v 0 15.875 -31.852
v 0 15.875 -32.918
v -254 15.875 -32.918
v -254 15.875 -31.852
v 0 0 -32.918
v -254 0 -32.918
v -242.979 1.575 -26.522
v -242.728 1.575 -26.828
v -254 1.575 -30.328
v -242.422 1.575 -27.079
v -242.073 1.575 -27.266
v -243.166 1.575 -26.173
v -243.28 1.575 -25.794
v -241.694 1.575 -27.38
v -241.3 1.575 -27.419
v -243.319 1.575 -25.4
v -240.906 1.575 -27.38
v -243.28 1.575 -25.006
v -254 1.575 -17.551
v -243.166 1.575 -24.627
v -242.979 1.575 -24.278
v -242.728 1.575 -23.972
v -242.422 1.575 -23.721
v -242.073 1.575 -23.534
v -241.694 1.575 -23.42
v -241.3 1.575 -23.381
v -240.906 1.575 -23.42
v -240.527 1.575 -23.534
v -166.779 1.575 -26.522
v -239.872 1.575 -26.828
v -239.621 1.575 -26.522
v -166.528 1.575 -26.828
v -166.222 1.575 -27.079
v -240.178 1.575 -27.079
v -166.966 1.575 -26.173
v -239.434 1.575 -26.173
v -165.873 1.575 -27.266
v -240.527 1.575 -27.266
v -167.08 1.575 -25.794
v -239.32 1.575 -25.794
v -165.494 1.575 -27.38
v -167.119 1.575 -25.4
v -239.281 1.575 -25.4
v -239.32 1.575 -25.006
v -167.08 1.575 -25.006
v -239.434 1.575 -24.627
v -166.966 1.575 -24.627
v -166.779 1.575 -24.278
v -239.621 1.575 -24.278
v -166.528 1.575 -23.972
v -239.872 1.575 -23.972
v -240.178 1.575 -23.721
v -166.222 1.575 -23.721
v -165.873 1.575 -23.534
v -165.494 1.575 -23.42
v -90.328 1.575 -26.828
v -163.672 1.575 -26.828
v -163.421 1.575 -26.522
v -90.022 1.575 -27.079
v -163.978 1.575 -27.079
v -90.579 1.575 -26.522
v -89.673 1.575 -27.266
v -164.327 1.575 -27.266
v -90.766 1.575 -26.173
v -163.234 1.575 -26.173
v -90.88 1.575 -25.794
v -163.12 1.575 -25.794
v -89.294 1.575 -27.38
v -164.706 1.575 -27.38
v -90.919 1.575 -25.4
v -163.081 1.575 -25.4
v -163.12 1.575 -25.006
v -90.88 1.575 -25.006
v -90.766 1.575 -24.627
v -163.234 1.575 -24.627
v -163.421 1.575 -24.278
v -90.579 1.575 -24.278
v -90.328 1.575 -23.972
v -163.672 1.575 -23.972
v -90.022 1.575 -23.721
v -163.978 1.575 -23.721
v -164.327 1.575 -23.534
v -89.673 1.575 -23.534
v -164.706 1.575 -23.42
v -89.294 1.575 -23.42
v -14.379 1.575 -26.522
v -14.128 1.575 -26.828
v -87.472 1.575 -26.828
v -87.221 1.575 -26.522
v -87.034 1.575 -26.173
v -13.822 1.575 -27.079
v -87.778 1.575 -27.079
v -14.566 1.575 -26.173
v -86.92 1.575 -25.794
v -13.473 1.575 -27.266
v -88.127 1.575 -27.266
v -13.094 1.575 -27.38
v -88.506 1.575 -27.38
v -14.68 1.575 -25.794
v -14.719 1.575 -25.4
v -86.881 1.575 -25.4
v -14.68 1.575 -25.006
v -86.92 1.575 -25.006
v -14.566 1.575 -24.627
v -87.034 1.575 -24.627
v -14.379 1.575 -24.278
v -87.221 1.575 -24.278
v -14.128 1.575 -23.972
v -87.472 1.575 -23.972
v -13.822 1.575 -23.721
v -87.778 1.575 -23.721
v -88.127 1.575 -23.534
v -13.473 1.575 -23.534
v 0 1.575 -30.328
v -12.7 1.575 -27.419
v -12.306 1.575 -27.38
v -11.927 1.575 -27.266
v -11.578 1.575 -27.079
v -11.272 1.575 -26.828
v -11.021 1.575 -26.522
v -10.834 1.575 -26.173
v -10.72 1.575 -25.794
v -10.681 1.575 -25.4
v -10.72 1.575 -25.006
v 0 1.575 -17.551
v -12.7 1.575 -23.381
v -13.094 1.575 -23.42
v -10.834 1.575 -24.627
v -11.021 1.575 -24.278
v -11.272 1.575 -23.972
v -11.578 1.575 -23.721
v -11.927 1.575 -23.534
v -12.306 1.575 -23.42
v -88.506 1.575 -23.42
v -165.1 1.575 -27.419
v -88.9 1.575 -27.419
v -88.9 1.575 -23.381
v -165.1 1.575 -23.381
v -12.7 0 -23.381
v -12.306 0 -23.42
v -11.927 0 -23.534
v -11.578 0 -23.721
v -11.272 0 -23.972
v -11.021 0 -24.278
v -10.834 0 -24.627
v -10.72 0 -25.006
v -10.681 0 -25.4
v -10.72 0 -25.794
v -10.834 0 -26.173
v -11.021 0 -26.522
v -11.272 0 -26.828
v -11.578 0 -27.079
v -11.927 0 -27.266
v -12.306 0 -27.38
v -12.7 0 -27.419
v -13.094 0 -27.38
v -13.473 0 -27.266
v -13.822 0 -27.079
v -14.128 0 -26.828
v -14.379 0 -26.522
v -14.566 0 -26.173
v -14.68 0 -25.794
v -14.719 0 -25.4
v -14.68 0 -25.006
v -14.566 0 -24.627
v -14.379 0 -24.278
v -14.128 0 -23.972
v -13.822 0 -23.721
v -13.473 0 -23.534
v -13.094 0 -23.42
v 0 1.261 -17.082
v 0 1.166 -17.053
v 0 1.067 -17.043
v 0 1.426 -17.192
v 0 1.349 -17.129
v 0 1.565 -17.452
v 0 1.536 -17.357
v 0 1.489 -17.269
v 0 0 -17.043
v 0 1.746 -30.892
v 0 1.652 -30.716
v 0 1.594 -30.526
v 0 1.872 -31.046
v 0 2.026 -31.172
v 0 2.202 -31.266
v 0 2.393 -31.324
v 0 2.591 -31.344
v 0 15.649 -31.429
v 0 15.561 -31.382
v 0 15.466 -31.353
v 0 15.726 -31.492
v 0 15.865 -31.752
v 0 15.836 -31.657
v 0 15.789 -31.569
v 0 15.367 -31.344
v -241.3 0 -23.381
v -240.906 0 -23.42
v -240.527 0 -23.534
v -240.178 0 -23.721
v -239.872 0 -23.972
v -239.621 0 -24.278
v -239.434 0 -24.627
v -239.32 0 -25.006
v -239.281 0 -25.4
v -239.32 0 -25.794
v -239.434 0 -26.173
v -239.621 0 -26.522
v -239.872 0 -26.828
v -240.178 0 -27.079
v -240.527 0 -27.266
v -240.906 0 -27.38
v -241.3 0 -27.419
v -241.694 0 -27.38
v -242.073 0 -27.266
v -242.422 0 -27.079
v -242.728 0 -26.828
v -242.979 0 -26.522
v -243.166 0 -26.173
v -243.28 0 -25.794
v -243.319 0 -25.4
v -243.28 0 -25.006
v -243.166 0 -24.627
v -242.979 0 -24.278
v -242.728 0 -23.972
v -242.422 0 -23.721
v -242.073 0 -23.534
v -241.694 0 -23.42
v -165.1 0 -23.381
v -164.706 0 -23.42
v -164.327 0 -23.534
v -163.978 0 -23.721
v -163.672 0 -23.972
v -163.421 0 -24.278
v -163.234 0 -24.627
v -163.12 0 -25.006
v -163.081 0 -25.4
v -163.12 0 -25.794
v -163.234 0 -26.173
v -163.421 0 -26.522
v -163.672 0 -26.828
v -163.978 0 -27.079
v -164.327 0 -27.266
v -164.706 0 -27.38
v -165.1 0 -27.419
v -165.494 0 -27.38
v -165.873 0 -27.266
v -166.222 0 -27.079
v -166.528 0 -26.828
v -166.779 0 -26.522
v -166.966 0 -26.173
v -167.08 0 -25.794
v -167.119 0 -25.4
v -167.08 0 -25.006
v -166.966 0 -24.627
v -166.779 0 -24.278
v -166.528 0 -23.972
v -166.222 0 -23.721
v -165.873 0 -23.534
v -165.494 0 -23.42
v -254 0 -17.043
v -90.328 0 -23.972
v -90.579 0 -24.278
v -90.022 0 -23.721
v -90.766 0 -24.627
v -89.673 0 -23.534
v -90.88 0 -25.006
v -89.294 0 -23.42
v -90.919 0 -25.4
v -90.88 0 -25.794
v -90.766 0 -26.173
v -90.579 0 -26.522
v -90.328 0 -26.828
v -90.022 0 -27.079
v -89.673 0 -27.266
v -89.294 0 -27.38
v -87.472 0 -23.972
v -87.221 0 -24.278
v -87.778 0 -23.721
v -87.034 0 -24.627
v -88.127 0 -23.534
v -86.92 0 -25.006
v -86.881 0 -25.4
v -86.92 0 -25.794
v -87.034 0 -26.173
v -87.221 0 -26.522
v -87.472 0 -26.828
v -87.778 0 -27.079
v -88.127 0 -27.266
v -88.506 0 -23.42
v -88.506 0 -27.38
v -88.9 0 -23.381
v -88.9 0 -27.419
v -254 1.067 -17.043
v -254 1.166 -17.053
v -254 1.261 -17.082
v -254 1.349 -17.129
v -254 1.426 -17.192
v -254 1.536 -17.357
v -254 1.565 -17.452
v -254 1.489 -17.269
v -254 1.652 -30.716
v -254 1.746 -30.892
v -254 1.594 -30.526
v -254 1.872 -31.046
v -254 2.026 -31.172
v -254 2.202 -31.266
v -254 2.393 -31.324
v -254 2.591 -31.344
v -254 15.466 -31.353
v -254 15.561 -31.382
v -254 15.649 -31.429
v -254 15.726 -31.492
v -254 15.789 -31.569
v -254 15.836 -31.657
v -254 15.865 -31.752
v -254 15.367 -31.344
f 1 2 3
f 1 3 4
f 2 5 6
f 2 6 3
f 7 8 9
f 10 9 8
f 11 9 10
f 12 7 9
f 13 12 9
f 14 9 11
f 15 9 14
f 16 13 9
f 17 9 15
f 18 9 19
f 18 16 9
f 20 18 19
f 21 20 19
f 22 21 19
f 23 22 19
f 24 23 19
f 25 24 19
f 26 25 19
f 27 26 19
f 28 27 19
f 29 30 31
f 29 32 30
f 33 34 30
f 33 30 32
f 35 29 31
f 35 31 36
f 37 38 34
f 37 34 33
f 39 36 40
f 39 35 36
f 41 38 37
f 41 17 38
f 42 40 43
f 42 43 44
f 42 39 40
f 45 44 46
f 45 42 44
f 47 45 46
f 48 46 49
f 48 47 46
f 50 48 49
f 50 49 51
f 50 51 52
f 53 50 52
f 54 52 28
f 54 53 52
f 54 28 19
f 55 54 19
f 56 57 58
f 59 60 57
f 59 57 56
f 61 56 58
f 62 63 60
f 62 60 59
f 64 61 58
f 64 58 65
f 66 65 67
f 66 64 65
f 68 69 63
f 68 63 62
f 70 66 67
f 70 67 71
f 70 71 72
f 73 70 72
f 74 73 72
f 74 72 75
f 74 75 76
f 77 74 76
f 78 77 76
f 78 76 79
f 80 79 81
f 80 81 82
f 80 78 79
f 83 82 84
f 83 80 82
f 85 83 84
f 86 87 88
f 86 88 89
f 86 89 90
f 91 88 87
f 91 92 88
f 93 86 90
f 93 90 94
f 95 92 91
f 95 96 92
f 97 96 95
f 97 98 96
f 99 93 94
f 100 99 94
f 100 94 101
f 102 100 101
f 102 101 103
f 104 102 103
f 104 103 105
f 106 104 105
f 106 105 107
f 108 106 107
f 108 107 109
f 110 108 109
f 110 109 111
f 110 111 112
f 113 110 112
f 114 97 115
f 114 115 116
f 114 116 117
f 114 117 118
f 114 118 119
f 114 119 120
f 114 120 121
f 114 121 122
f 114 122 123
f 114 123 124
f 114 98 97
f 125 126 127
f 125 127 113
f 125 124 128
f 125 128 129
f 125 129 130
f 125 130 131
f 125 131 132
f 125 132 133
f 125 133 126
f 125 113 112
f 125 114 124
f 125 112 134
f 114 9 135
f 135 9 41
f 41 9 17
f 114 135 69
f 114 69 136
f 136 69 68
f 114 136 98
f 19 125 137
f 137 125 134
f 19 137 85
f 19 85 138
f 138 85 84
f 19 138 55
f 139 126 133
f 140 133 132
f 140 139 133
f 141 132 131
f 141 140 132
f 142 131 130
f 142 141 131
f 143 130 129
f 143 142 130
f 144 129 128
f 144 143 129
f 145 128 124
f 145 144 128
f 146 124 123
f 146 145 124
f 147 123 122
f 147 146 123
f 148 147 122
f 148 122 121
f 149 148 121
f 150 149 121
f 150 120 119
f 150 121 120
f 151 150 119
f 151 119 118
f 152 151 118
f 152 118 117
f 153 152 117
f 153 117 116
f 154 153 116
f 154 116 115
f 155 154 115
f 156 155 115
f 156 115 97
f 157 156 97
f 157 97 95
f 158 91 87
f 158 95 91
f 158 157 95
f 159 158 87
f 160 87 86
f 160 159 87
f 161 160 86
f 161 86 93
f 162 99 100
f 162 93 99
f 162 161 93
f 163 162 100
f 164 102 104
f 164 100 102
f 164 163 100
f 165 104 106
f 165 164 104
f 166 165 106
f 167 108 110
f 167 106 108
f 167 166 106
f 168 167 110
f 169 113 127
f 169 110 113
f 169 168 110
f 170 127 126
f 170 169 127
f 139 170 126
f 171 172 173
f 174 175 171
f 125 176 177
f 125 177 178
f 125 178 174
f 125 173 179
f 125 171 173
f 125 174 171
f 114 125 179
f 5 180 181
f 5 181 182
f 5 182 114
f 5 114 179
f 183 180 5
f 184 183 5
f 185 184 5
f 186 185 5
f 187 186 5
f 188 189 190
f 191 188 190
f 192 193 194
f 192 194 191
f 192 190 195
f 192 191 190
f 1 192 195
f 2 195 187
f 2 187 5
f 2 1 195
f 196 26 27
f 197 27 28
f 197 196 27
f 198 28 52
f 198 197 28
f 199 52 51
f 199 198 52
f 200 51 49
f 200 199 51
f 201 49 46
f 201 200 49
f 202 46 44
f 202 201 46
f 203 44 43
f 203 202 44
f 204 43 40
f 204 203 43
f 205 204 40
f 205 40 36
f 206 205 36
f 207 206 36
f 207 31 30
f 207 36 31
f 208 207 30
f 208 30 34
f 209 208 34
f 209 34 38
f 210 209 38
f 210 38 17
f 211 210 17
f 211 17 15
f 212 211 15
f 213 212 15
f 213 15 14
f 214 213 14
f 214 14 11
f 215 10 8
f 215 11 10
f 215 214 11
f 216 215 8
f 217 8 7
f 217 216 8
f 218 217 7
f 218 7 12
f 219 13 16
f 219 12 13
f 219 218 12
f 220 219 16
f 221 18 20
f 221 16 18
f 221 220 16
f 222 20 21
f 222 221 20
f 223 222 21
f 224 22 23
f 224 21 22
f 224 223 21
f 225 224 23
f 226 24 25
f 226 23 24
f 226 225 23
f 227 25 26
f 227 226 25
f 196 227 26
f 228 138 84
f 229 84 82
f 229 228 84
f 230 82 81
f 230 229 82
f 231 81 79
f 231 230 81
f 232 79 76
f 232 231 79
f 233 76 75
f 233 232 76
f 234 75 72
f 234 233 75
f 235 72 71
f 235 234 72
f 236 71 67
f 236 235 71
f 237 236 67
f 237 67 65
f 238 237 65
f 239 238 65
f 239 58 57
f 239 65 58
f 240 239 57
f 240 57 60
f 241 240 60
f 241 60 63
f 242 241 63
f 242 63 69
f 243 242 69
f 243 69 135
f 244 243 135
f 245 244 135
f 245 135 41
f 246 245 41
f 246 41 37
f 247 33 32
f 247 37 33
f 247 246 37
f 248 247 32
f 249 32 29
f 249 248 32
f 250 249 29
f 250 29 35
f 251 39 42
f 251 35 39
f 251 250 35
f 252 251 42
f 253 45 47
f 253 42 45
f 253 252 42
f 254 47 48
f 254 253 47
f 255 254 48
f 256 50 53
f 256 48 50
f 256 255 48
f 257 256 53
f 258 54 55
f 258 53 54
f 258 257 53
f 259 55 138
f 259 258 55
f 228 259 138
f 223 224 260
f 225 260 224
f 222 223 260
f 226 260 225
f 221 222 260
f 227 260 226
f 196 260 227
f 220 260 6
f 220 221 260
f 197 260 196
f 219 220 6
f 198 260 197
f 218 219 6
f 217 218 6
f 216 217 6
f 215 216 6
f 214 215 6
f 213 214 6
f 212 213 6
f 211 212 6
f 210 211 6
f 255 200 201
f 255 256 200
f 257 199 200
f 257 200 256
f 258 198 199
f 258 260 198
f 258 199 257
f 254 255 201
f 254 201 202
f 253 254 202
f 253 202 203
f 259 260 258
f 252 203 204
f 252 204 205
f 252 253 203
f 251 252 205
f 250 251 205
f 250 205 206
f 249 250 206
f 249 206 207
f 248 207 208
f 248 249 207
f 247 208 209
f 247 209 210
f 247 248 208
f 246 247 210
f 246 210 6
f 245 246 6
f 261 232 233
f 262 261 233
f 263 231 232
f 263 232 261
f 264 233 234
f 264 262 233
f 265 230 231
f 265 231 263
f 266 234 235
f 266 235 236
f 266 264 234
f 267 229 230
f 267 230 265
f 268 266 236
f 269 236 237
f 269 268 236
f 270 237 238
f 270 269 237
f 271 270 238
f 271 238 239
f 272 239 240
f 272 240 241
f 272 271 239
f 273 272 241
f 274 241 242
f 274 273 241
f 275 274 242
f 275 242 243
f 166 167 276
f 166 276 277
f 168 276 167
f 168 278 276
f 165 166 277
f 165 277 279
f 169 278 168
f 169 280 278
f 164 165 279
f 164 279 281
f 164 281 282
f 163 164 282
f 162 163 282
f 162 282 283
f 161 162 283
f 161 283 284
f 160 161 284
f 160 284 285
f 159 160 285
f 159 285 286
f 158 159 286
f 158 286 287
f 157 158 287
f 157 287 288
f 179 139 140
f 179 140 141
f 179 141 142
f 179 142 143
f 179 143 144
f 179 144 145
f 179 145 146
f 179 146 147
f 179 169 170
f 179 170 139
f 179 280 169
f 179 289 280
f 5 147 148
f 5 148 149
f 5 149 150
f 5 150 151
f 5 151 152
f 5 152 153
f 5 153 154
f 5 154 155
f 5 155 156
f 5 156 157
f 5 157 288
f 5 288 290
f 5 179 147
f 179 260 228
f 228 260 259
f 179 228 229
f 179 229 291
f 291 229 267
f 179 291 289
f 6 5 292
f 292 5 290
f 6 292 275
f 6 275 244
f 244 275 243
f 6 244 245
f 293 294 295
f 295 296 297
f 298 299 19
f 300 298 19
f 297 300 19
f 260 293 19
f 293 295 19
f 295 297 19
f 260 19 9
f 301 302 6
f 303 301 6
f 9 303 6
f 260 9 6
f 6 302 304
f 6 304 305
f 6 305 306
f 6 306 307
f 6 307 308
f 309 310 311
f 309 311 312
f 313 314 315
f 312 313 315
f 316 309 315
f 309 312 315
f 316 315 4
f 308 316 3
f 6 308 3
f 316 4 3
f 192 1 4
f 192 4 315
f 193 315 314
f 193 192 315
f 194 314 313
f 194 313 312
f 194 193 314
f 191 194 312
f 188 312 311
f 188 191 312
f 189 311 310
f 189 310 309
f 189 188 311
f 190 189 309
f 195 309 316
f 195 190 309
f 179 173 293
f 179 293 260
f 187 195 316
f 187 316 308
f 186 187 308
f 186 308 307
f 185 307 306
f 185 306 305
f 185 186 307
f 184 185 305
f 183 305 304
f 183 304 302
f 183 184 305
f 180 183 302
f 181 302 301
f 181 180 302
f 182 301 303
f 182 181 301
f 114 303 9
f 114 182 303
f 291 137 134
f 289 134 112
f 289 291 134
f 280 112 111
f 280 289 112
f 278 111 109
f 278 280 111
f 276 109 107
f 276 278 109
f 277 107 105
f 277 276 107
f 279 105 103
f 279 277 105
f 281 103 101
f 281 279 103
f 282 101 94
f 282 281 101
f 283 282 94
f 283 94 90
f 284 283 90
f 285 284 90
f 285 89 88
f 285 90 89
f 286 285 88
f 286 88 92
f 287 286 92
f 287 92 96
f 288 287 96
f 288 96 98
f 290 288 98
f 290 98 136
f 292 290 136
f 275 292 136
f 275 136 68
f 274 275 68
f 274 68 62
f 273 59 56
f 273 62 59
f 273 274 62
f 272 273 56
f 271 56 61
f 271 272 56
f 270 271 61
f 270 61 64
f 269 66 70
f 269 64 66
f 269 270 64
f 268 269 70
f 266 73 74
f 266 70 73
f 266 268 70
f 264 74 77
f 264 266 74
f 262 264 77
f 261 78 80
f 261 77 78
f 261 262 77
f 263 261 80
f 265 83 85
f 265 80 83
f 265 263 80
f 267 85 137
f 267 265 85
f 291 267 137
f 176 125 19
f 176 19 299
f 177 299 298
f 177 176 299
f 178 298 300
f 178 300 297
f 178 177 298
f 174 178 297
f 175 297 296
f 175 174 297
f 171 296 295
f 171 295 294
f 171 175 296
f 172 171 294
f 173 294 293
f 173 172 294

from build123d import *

# Parameters (mm, degrees)
BOSS_EXTRUDE1_DEPTH = 254
SKETCH3_R           = 2.0193
CUT_EXTRUDE1_DEPTH  = 257.615737404


with BuildPart() as part:
    # Sketch6 → Boss-Extrude1 (new body)
    with BuildSketch(Plane(origin=(0, 0, 0), x_dir=(0, 0, -1), z_dir=(1, 0, 0))):
        with BuildLine():
            Line((17.0434, 0), (32.9184, 0))
            Line((32.9184, 0), (32.9184, 15.875))
            Line((32.9184, 15.875), (31.8516, 15.875))
            ThreePointArc((31.8516, 15.875), (31.492389755, 15.726210245), (31.3436, 15.367))
            Line((31.3436, 15.367), (31.3436, 2.5908))
            ThreePointArc((31.3436, 2.5908), (31.04602049, 1.87237951), (30.3276, 1.5748))
            Line((30.3276, 1.5748), (17.5514, 1.5748))
            ThreePointArc((17.5514, 1.5748), (17.192189755, 1.426010245), (17.0434, 1.0668))
            Line((17.0434, 1.0668), (17.0434, 0))
        make_face()
    extrude(amount=-BOSS_EXTRUDE1_DEPTH)

    # Sketch3 → Cut-Extrude1 (cut, through all)
    with BuildSketch(Plane(origin=(0, 0, 0), x_dir=(1, 0, 0), z_dir=(0, 1, 0))):
        with Locations(Location((-12.7, 25.4, 0), (0, 0, 270))):
            Circle(SKETCH3_R)
        with Locations(Location((-88.9, 25.4, 0), (0, 0, 270))):
            Circle(SKETCH3_R)
        with Locations(Location((-165.1, 25.4, 0), (0, 0, 270))):
            Circle(SKETCH3_R)
        with Locations(Location((-241.3, 25.4, 0), (0, 0, 270))):
            Circle(SKETCH3_R)
    extrude(amount=CUT_EXTRUDE1_DEPTH, mode=Mode.SUBTRACT)


solid = part.part
